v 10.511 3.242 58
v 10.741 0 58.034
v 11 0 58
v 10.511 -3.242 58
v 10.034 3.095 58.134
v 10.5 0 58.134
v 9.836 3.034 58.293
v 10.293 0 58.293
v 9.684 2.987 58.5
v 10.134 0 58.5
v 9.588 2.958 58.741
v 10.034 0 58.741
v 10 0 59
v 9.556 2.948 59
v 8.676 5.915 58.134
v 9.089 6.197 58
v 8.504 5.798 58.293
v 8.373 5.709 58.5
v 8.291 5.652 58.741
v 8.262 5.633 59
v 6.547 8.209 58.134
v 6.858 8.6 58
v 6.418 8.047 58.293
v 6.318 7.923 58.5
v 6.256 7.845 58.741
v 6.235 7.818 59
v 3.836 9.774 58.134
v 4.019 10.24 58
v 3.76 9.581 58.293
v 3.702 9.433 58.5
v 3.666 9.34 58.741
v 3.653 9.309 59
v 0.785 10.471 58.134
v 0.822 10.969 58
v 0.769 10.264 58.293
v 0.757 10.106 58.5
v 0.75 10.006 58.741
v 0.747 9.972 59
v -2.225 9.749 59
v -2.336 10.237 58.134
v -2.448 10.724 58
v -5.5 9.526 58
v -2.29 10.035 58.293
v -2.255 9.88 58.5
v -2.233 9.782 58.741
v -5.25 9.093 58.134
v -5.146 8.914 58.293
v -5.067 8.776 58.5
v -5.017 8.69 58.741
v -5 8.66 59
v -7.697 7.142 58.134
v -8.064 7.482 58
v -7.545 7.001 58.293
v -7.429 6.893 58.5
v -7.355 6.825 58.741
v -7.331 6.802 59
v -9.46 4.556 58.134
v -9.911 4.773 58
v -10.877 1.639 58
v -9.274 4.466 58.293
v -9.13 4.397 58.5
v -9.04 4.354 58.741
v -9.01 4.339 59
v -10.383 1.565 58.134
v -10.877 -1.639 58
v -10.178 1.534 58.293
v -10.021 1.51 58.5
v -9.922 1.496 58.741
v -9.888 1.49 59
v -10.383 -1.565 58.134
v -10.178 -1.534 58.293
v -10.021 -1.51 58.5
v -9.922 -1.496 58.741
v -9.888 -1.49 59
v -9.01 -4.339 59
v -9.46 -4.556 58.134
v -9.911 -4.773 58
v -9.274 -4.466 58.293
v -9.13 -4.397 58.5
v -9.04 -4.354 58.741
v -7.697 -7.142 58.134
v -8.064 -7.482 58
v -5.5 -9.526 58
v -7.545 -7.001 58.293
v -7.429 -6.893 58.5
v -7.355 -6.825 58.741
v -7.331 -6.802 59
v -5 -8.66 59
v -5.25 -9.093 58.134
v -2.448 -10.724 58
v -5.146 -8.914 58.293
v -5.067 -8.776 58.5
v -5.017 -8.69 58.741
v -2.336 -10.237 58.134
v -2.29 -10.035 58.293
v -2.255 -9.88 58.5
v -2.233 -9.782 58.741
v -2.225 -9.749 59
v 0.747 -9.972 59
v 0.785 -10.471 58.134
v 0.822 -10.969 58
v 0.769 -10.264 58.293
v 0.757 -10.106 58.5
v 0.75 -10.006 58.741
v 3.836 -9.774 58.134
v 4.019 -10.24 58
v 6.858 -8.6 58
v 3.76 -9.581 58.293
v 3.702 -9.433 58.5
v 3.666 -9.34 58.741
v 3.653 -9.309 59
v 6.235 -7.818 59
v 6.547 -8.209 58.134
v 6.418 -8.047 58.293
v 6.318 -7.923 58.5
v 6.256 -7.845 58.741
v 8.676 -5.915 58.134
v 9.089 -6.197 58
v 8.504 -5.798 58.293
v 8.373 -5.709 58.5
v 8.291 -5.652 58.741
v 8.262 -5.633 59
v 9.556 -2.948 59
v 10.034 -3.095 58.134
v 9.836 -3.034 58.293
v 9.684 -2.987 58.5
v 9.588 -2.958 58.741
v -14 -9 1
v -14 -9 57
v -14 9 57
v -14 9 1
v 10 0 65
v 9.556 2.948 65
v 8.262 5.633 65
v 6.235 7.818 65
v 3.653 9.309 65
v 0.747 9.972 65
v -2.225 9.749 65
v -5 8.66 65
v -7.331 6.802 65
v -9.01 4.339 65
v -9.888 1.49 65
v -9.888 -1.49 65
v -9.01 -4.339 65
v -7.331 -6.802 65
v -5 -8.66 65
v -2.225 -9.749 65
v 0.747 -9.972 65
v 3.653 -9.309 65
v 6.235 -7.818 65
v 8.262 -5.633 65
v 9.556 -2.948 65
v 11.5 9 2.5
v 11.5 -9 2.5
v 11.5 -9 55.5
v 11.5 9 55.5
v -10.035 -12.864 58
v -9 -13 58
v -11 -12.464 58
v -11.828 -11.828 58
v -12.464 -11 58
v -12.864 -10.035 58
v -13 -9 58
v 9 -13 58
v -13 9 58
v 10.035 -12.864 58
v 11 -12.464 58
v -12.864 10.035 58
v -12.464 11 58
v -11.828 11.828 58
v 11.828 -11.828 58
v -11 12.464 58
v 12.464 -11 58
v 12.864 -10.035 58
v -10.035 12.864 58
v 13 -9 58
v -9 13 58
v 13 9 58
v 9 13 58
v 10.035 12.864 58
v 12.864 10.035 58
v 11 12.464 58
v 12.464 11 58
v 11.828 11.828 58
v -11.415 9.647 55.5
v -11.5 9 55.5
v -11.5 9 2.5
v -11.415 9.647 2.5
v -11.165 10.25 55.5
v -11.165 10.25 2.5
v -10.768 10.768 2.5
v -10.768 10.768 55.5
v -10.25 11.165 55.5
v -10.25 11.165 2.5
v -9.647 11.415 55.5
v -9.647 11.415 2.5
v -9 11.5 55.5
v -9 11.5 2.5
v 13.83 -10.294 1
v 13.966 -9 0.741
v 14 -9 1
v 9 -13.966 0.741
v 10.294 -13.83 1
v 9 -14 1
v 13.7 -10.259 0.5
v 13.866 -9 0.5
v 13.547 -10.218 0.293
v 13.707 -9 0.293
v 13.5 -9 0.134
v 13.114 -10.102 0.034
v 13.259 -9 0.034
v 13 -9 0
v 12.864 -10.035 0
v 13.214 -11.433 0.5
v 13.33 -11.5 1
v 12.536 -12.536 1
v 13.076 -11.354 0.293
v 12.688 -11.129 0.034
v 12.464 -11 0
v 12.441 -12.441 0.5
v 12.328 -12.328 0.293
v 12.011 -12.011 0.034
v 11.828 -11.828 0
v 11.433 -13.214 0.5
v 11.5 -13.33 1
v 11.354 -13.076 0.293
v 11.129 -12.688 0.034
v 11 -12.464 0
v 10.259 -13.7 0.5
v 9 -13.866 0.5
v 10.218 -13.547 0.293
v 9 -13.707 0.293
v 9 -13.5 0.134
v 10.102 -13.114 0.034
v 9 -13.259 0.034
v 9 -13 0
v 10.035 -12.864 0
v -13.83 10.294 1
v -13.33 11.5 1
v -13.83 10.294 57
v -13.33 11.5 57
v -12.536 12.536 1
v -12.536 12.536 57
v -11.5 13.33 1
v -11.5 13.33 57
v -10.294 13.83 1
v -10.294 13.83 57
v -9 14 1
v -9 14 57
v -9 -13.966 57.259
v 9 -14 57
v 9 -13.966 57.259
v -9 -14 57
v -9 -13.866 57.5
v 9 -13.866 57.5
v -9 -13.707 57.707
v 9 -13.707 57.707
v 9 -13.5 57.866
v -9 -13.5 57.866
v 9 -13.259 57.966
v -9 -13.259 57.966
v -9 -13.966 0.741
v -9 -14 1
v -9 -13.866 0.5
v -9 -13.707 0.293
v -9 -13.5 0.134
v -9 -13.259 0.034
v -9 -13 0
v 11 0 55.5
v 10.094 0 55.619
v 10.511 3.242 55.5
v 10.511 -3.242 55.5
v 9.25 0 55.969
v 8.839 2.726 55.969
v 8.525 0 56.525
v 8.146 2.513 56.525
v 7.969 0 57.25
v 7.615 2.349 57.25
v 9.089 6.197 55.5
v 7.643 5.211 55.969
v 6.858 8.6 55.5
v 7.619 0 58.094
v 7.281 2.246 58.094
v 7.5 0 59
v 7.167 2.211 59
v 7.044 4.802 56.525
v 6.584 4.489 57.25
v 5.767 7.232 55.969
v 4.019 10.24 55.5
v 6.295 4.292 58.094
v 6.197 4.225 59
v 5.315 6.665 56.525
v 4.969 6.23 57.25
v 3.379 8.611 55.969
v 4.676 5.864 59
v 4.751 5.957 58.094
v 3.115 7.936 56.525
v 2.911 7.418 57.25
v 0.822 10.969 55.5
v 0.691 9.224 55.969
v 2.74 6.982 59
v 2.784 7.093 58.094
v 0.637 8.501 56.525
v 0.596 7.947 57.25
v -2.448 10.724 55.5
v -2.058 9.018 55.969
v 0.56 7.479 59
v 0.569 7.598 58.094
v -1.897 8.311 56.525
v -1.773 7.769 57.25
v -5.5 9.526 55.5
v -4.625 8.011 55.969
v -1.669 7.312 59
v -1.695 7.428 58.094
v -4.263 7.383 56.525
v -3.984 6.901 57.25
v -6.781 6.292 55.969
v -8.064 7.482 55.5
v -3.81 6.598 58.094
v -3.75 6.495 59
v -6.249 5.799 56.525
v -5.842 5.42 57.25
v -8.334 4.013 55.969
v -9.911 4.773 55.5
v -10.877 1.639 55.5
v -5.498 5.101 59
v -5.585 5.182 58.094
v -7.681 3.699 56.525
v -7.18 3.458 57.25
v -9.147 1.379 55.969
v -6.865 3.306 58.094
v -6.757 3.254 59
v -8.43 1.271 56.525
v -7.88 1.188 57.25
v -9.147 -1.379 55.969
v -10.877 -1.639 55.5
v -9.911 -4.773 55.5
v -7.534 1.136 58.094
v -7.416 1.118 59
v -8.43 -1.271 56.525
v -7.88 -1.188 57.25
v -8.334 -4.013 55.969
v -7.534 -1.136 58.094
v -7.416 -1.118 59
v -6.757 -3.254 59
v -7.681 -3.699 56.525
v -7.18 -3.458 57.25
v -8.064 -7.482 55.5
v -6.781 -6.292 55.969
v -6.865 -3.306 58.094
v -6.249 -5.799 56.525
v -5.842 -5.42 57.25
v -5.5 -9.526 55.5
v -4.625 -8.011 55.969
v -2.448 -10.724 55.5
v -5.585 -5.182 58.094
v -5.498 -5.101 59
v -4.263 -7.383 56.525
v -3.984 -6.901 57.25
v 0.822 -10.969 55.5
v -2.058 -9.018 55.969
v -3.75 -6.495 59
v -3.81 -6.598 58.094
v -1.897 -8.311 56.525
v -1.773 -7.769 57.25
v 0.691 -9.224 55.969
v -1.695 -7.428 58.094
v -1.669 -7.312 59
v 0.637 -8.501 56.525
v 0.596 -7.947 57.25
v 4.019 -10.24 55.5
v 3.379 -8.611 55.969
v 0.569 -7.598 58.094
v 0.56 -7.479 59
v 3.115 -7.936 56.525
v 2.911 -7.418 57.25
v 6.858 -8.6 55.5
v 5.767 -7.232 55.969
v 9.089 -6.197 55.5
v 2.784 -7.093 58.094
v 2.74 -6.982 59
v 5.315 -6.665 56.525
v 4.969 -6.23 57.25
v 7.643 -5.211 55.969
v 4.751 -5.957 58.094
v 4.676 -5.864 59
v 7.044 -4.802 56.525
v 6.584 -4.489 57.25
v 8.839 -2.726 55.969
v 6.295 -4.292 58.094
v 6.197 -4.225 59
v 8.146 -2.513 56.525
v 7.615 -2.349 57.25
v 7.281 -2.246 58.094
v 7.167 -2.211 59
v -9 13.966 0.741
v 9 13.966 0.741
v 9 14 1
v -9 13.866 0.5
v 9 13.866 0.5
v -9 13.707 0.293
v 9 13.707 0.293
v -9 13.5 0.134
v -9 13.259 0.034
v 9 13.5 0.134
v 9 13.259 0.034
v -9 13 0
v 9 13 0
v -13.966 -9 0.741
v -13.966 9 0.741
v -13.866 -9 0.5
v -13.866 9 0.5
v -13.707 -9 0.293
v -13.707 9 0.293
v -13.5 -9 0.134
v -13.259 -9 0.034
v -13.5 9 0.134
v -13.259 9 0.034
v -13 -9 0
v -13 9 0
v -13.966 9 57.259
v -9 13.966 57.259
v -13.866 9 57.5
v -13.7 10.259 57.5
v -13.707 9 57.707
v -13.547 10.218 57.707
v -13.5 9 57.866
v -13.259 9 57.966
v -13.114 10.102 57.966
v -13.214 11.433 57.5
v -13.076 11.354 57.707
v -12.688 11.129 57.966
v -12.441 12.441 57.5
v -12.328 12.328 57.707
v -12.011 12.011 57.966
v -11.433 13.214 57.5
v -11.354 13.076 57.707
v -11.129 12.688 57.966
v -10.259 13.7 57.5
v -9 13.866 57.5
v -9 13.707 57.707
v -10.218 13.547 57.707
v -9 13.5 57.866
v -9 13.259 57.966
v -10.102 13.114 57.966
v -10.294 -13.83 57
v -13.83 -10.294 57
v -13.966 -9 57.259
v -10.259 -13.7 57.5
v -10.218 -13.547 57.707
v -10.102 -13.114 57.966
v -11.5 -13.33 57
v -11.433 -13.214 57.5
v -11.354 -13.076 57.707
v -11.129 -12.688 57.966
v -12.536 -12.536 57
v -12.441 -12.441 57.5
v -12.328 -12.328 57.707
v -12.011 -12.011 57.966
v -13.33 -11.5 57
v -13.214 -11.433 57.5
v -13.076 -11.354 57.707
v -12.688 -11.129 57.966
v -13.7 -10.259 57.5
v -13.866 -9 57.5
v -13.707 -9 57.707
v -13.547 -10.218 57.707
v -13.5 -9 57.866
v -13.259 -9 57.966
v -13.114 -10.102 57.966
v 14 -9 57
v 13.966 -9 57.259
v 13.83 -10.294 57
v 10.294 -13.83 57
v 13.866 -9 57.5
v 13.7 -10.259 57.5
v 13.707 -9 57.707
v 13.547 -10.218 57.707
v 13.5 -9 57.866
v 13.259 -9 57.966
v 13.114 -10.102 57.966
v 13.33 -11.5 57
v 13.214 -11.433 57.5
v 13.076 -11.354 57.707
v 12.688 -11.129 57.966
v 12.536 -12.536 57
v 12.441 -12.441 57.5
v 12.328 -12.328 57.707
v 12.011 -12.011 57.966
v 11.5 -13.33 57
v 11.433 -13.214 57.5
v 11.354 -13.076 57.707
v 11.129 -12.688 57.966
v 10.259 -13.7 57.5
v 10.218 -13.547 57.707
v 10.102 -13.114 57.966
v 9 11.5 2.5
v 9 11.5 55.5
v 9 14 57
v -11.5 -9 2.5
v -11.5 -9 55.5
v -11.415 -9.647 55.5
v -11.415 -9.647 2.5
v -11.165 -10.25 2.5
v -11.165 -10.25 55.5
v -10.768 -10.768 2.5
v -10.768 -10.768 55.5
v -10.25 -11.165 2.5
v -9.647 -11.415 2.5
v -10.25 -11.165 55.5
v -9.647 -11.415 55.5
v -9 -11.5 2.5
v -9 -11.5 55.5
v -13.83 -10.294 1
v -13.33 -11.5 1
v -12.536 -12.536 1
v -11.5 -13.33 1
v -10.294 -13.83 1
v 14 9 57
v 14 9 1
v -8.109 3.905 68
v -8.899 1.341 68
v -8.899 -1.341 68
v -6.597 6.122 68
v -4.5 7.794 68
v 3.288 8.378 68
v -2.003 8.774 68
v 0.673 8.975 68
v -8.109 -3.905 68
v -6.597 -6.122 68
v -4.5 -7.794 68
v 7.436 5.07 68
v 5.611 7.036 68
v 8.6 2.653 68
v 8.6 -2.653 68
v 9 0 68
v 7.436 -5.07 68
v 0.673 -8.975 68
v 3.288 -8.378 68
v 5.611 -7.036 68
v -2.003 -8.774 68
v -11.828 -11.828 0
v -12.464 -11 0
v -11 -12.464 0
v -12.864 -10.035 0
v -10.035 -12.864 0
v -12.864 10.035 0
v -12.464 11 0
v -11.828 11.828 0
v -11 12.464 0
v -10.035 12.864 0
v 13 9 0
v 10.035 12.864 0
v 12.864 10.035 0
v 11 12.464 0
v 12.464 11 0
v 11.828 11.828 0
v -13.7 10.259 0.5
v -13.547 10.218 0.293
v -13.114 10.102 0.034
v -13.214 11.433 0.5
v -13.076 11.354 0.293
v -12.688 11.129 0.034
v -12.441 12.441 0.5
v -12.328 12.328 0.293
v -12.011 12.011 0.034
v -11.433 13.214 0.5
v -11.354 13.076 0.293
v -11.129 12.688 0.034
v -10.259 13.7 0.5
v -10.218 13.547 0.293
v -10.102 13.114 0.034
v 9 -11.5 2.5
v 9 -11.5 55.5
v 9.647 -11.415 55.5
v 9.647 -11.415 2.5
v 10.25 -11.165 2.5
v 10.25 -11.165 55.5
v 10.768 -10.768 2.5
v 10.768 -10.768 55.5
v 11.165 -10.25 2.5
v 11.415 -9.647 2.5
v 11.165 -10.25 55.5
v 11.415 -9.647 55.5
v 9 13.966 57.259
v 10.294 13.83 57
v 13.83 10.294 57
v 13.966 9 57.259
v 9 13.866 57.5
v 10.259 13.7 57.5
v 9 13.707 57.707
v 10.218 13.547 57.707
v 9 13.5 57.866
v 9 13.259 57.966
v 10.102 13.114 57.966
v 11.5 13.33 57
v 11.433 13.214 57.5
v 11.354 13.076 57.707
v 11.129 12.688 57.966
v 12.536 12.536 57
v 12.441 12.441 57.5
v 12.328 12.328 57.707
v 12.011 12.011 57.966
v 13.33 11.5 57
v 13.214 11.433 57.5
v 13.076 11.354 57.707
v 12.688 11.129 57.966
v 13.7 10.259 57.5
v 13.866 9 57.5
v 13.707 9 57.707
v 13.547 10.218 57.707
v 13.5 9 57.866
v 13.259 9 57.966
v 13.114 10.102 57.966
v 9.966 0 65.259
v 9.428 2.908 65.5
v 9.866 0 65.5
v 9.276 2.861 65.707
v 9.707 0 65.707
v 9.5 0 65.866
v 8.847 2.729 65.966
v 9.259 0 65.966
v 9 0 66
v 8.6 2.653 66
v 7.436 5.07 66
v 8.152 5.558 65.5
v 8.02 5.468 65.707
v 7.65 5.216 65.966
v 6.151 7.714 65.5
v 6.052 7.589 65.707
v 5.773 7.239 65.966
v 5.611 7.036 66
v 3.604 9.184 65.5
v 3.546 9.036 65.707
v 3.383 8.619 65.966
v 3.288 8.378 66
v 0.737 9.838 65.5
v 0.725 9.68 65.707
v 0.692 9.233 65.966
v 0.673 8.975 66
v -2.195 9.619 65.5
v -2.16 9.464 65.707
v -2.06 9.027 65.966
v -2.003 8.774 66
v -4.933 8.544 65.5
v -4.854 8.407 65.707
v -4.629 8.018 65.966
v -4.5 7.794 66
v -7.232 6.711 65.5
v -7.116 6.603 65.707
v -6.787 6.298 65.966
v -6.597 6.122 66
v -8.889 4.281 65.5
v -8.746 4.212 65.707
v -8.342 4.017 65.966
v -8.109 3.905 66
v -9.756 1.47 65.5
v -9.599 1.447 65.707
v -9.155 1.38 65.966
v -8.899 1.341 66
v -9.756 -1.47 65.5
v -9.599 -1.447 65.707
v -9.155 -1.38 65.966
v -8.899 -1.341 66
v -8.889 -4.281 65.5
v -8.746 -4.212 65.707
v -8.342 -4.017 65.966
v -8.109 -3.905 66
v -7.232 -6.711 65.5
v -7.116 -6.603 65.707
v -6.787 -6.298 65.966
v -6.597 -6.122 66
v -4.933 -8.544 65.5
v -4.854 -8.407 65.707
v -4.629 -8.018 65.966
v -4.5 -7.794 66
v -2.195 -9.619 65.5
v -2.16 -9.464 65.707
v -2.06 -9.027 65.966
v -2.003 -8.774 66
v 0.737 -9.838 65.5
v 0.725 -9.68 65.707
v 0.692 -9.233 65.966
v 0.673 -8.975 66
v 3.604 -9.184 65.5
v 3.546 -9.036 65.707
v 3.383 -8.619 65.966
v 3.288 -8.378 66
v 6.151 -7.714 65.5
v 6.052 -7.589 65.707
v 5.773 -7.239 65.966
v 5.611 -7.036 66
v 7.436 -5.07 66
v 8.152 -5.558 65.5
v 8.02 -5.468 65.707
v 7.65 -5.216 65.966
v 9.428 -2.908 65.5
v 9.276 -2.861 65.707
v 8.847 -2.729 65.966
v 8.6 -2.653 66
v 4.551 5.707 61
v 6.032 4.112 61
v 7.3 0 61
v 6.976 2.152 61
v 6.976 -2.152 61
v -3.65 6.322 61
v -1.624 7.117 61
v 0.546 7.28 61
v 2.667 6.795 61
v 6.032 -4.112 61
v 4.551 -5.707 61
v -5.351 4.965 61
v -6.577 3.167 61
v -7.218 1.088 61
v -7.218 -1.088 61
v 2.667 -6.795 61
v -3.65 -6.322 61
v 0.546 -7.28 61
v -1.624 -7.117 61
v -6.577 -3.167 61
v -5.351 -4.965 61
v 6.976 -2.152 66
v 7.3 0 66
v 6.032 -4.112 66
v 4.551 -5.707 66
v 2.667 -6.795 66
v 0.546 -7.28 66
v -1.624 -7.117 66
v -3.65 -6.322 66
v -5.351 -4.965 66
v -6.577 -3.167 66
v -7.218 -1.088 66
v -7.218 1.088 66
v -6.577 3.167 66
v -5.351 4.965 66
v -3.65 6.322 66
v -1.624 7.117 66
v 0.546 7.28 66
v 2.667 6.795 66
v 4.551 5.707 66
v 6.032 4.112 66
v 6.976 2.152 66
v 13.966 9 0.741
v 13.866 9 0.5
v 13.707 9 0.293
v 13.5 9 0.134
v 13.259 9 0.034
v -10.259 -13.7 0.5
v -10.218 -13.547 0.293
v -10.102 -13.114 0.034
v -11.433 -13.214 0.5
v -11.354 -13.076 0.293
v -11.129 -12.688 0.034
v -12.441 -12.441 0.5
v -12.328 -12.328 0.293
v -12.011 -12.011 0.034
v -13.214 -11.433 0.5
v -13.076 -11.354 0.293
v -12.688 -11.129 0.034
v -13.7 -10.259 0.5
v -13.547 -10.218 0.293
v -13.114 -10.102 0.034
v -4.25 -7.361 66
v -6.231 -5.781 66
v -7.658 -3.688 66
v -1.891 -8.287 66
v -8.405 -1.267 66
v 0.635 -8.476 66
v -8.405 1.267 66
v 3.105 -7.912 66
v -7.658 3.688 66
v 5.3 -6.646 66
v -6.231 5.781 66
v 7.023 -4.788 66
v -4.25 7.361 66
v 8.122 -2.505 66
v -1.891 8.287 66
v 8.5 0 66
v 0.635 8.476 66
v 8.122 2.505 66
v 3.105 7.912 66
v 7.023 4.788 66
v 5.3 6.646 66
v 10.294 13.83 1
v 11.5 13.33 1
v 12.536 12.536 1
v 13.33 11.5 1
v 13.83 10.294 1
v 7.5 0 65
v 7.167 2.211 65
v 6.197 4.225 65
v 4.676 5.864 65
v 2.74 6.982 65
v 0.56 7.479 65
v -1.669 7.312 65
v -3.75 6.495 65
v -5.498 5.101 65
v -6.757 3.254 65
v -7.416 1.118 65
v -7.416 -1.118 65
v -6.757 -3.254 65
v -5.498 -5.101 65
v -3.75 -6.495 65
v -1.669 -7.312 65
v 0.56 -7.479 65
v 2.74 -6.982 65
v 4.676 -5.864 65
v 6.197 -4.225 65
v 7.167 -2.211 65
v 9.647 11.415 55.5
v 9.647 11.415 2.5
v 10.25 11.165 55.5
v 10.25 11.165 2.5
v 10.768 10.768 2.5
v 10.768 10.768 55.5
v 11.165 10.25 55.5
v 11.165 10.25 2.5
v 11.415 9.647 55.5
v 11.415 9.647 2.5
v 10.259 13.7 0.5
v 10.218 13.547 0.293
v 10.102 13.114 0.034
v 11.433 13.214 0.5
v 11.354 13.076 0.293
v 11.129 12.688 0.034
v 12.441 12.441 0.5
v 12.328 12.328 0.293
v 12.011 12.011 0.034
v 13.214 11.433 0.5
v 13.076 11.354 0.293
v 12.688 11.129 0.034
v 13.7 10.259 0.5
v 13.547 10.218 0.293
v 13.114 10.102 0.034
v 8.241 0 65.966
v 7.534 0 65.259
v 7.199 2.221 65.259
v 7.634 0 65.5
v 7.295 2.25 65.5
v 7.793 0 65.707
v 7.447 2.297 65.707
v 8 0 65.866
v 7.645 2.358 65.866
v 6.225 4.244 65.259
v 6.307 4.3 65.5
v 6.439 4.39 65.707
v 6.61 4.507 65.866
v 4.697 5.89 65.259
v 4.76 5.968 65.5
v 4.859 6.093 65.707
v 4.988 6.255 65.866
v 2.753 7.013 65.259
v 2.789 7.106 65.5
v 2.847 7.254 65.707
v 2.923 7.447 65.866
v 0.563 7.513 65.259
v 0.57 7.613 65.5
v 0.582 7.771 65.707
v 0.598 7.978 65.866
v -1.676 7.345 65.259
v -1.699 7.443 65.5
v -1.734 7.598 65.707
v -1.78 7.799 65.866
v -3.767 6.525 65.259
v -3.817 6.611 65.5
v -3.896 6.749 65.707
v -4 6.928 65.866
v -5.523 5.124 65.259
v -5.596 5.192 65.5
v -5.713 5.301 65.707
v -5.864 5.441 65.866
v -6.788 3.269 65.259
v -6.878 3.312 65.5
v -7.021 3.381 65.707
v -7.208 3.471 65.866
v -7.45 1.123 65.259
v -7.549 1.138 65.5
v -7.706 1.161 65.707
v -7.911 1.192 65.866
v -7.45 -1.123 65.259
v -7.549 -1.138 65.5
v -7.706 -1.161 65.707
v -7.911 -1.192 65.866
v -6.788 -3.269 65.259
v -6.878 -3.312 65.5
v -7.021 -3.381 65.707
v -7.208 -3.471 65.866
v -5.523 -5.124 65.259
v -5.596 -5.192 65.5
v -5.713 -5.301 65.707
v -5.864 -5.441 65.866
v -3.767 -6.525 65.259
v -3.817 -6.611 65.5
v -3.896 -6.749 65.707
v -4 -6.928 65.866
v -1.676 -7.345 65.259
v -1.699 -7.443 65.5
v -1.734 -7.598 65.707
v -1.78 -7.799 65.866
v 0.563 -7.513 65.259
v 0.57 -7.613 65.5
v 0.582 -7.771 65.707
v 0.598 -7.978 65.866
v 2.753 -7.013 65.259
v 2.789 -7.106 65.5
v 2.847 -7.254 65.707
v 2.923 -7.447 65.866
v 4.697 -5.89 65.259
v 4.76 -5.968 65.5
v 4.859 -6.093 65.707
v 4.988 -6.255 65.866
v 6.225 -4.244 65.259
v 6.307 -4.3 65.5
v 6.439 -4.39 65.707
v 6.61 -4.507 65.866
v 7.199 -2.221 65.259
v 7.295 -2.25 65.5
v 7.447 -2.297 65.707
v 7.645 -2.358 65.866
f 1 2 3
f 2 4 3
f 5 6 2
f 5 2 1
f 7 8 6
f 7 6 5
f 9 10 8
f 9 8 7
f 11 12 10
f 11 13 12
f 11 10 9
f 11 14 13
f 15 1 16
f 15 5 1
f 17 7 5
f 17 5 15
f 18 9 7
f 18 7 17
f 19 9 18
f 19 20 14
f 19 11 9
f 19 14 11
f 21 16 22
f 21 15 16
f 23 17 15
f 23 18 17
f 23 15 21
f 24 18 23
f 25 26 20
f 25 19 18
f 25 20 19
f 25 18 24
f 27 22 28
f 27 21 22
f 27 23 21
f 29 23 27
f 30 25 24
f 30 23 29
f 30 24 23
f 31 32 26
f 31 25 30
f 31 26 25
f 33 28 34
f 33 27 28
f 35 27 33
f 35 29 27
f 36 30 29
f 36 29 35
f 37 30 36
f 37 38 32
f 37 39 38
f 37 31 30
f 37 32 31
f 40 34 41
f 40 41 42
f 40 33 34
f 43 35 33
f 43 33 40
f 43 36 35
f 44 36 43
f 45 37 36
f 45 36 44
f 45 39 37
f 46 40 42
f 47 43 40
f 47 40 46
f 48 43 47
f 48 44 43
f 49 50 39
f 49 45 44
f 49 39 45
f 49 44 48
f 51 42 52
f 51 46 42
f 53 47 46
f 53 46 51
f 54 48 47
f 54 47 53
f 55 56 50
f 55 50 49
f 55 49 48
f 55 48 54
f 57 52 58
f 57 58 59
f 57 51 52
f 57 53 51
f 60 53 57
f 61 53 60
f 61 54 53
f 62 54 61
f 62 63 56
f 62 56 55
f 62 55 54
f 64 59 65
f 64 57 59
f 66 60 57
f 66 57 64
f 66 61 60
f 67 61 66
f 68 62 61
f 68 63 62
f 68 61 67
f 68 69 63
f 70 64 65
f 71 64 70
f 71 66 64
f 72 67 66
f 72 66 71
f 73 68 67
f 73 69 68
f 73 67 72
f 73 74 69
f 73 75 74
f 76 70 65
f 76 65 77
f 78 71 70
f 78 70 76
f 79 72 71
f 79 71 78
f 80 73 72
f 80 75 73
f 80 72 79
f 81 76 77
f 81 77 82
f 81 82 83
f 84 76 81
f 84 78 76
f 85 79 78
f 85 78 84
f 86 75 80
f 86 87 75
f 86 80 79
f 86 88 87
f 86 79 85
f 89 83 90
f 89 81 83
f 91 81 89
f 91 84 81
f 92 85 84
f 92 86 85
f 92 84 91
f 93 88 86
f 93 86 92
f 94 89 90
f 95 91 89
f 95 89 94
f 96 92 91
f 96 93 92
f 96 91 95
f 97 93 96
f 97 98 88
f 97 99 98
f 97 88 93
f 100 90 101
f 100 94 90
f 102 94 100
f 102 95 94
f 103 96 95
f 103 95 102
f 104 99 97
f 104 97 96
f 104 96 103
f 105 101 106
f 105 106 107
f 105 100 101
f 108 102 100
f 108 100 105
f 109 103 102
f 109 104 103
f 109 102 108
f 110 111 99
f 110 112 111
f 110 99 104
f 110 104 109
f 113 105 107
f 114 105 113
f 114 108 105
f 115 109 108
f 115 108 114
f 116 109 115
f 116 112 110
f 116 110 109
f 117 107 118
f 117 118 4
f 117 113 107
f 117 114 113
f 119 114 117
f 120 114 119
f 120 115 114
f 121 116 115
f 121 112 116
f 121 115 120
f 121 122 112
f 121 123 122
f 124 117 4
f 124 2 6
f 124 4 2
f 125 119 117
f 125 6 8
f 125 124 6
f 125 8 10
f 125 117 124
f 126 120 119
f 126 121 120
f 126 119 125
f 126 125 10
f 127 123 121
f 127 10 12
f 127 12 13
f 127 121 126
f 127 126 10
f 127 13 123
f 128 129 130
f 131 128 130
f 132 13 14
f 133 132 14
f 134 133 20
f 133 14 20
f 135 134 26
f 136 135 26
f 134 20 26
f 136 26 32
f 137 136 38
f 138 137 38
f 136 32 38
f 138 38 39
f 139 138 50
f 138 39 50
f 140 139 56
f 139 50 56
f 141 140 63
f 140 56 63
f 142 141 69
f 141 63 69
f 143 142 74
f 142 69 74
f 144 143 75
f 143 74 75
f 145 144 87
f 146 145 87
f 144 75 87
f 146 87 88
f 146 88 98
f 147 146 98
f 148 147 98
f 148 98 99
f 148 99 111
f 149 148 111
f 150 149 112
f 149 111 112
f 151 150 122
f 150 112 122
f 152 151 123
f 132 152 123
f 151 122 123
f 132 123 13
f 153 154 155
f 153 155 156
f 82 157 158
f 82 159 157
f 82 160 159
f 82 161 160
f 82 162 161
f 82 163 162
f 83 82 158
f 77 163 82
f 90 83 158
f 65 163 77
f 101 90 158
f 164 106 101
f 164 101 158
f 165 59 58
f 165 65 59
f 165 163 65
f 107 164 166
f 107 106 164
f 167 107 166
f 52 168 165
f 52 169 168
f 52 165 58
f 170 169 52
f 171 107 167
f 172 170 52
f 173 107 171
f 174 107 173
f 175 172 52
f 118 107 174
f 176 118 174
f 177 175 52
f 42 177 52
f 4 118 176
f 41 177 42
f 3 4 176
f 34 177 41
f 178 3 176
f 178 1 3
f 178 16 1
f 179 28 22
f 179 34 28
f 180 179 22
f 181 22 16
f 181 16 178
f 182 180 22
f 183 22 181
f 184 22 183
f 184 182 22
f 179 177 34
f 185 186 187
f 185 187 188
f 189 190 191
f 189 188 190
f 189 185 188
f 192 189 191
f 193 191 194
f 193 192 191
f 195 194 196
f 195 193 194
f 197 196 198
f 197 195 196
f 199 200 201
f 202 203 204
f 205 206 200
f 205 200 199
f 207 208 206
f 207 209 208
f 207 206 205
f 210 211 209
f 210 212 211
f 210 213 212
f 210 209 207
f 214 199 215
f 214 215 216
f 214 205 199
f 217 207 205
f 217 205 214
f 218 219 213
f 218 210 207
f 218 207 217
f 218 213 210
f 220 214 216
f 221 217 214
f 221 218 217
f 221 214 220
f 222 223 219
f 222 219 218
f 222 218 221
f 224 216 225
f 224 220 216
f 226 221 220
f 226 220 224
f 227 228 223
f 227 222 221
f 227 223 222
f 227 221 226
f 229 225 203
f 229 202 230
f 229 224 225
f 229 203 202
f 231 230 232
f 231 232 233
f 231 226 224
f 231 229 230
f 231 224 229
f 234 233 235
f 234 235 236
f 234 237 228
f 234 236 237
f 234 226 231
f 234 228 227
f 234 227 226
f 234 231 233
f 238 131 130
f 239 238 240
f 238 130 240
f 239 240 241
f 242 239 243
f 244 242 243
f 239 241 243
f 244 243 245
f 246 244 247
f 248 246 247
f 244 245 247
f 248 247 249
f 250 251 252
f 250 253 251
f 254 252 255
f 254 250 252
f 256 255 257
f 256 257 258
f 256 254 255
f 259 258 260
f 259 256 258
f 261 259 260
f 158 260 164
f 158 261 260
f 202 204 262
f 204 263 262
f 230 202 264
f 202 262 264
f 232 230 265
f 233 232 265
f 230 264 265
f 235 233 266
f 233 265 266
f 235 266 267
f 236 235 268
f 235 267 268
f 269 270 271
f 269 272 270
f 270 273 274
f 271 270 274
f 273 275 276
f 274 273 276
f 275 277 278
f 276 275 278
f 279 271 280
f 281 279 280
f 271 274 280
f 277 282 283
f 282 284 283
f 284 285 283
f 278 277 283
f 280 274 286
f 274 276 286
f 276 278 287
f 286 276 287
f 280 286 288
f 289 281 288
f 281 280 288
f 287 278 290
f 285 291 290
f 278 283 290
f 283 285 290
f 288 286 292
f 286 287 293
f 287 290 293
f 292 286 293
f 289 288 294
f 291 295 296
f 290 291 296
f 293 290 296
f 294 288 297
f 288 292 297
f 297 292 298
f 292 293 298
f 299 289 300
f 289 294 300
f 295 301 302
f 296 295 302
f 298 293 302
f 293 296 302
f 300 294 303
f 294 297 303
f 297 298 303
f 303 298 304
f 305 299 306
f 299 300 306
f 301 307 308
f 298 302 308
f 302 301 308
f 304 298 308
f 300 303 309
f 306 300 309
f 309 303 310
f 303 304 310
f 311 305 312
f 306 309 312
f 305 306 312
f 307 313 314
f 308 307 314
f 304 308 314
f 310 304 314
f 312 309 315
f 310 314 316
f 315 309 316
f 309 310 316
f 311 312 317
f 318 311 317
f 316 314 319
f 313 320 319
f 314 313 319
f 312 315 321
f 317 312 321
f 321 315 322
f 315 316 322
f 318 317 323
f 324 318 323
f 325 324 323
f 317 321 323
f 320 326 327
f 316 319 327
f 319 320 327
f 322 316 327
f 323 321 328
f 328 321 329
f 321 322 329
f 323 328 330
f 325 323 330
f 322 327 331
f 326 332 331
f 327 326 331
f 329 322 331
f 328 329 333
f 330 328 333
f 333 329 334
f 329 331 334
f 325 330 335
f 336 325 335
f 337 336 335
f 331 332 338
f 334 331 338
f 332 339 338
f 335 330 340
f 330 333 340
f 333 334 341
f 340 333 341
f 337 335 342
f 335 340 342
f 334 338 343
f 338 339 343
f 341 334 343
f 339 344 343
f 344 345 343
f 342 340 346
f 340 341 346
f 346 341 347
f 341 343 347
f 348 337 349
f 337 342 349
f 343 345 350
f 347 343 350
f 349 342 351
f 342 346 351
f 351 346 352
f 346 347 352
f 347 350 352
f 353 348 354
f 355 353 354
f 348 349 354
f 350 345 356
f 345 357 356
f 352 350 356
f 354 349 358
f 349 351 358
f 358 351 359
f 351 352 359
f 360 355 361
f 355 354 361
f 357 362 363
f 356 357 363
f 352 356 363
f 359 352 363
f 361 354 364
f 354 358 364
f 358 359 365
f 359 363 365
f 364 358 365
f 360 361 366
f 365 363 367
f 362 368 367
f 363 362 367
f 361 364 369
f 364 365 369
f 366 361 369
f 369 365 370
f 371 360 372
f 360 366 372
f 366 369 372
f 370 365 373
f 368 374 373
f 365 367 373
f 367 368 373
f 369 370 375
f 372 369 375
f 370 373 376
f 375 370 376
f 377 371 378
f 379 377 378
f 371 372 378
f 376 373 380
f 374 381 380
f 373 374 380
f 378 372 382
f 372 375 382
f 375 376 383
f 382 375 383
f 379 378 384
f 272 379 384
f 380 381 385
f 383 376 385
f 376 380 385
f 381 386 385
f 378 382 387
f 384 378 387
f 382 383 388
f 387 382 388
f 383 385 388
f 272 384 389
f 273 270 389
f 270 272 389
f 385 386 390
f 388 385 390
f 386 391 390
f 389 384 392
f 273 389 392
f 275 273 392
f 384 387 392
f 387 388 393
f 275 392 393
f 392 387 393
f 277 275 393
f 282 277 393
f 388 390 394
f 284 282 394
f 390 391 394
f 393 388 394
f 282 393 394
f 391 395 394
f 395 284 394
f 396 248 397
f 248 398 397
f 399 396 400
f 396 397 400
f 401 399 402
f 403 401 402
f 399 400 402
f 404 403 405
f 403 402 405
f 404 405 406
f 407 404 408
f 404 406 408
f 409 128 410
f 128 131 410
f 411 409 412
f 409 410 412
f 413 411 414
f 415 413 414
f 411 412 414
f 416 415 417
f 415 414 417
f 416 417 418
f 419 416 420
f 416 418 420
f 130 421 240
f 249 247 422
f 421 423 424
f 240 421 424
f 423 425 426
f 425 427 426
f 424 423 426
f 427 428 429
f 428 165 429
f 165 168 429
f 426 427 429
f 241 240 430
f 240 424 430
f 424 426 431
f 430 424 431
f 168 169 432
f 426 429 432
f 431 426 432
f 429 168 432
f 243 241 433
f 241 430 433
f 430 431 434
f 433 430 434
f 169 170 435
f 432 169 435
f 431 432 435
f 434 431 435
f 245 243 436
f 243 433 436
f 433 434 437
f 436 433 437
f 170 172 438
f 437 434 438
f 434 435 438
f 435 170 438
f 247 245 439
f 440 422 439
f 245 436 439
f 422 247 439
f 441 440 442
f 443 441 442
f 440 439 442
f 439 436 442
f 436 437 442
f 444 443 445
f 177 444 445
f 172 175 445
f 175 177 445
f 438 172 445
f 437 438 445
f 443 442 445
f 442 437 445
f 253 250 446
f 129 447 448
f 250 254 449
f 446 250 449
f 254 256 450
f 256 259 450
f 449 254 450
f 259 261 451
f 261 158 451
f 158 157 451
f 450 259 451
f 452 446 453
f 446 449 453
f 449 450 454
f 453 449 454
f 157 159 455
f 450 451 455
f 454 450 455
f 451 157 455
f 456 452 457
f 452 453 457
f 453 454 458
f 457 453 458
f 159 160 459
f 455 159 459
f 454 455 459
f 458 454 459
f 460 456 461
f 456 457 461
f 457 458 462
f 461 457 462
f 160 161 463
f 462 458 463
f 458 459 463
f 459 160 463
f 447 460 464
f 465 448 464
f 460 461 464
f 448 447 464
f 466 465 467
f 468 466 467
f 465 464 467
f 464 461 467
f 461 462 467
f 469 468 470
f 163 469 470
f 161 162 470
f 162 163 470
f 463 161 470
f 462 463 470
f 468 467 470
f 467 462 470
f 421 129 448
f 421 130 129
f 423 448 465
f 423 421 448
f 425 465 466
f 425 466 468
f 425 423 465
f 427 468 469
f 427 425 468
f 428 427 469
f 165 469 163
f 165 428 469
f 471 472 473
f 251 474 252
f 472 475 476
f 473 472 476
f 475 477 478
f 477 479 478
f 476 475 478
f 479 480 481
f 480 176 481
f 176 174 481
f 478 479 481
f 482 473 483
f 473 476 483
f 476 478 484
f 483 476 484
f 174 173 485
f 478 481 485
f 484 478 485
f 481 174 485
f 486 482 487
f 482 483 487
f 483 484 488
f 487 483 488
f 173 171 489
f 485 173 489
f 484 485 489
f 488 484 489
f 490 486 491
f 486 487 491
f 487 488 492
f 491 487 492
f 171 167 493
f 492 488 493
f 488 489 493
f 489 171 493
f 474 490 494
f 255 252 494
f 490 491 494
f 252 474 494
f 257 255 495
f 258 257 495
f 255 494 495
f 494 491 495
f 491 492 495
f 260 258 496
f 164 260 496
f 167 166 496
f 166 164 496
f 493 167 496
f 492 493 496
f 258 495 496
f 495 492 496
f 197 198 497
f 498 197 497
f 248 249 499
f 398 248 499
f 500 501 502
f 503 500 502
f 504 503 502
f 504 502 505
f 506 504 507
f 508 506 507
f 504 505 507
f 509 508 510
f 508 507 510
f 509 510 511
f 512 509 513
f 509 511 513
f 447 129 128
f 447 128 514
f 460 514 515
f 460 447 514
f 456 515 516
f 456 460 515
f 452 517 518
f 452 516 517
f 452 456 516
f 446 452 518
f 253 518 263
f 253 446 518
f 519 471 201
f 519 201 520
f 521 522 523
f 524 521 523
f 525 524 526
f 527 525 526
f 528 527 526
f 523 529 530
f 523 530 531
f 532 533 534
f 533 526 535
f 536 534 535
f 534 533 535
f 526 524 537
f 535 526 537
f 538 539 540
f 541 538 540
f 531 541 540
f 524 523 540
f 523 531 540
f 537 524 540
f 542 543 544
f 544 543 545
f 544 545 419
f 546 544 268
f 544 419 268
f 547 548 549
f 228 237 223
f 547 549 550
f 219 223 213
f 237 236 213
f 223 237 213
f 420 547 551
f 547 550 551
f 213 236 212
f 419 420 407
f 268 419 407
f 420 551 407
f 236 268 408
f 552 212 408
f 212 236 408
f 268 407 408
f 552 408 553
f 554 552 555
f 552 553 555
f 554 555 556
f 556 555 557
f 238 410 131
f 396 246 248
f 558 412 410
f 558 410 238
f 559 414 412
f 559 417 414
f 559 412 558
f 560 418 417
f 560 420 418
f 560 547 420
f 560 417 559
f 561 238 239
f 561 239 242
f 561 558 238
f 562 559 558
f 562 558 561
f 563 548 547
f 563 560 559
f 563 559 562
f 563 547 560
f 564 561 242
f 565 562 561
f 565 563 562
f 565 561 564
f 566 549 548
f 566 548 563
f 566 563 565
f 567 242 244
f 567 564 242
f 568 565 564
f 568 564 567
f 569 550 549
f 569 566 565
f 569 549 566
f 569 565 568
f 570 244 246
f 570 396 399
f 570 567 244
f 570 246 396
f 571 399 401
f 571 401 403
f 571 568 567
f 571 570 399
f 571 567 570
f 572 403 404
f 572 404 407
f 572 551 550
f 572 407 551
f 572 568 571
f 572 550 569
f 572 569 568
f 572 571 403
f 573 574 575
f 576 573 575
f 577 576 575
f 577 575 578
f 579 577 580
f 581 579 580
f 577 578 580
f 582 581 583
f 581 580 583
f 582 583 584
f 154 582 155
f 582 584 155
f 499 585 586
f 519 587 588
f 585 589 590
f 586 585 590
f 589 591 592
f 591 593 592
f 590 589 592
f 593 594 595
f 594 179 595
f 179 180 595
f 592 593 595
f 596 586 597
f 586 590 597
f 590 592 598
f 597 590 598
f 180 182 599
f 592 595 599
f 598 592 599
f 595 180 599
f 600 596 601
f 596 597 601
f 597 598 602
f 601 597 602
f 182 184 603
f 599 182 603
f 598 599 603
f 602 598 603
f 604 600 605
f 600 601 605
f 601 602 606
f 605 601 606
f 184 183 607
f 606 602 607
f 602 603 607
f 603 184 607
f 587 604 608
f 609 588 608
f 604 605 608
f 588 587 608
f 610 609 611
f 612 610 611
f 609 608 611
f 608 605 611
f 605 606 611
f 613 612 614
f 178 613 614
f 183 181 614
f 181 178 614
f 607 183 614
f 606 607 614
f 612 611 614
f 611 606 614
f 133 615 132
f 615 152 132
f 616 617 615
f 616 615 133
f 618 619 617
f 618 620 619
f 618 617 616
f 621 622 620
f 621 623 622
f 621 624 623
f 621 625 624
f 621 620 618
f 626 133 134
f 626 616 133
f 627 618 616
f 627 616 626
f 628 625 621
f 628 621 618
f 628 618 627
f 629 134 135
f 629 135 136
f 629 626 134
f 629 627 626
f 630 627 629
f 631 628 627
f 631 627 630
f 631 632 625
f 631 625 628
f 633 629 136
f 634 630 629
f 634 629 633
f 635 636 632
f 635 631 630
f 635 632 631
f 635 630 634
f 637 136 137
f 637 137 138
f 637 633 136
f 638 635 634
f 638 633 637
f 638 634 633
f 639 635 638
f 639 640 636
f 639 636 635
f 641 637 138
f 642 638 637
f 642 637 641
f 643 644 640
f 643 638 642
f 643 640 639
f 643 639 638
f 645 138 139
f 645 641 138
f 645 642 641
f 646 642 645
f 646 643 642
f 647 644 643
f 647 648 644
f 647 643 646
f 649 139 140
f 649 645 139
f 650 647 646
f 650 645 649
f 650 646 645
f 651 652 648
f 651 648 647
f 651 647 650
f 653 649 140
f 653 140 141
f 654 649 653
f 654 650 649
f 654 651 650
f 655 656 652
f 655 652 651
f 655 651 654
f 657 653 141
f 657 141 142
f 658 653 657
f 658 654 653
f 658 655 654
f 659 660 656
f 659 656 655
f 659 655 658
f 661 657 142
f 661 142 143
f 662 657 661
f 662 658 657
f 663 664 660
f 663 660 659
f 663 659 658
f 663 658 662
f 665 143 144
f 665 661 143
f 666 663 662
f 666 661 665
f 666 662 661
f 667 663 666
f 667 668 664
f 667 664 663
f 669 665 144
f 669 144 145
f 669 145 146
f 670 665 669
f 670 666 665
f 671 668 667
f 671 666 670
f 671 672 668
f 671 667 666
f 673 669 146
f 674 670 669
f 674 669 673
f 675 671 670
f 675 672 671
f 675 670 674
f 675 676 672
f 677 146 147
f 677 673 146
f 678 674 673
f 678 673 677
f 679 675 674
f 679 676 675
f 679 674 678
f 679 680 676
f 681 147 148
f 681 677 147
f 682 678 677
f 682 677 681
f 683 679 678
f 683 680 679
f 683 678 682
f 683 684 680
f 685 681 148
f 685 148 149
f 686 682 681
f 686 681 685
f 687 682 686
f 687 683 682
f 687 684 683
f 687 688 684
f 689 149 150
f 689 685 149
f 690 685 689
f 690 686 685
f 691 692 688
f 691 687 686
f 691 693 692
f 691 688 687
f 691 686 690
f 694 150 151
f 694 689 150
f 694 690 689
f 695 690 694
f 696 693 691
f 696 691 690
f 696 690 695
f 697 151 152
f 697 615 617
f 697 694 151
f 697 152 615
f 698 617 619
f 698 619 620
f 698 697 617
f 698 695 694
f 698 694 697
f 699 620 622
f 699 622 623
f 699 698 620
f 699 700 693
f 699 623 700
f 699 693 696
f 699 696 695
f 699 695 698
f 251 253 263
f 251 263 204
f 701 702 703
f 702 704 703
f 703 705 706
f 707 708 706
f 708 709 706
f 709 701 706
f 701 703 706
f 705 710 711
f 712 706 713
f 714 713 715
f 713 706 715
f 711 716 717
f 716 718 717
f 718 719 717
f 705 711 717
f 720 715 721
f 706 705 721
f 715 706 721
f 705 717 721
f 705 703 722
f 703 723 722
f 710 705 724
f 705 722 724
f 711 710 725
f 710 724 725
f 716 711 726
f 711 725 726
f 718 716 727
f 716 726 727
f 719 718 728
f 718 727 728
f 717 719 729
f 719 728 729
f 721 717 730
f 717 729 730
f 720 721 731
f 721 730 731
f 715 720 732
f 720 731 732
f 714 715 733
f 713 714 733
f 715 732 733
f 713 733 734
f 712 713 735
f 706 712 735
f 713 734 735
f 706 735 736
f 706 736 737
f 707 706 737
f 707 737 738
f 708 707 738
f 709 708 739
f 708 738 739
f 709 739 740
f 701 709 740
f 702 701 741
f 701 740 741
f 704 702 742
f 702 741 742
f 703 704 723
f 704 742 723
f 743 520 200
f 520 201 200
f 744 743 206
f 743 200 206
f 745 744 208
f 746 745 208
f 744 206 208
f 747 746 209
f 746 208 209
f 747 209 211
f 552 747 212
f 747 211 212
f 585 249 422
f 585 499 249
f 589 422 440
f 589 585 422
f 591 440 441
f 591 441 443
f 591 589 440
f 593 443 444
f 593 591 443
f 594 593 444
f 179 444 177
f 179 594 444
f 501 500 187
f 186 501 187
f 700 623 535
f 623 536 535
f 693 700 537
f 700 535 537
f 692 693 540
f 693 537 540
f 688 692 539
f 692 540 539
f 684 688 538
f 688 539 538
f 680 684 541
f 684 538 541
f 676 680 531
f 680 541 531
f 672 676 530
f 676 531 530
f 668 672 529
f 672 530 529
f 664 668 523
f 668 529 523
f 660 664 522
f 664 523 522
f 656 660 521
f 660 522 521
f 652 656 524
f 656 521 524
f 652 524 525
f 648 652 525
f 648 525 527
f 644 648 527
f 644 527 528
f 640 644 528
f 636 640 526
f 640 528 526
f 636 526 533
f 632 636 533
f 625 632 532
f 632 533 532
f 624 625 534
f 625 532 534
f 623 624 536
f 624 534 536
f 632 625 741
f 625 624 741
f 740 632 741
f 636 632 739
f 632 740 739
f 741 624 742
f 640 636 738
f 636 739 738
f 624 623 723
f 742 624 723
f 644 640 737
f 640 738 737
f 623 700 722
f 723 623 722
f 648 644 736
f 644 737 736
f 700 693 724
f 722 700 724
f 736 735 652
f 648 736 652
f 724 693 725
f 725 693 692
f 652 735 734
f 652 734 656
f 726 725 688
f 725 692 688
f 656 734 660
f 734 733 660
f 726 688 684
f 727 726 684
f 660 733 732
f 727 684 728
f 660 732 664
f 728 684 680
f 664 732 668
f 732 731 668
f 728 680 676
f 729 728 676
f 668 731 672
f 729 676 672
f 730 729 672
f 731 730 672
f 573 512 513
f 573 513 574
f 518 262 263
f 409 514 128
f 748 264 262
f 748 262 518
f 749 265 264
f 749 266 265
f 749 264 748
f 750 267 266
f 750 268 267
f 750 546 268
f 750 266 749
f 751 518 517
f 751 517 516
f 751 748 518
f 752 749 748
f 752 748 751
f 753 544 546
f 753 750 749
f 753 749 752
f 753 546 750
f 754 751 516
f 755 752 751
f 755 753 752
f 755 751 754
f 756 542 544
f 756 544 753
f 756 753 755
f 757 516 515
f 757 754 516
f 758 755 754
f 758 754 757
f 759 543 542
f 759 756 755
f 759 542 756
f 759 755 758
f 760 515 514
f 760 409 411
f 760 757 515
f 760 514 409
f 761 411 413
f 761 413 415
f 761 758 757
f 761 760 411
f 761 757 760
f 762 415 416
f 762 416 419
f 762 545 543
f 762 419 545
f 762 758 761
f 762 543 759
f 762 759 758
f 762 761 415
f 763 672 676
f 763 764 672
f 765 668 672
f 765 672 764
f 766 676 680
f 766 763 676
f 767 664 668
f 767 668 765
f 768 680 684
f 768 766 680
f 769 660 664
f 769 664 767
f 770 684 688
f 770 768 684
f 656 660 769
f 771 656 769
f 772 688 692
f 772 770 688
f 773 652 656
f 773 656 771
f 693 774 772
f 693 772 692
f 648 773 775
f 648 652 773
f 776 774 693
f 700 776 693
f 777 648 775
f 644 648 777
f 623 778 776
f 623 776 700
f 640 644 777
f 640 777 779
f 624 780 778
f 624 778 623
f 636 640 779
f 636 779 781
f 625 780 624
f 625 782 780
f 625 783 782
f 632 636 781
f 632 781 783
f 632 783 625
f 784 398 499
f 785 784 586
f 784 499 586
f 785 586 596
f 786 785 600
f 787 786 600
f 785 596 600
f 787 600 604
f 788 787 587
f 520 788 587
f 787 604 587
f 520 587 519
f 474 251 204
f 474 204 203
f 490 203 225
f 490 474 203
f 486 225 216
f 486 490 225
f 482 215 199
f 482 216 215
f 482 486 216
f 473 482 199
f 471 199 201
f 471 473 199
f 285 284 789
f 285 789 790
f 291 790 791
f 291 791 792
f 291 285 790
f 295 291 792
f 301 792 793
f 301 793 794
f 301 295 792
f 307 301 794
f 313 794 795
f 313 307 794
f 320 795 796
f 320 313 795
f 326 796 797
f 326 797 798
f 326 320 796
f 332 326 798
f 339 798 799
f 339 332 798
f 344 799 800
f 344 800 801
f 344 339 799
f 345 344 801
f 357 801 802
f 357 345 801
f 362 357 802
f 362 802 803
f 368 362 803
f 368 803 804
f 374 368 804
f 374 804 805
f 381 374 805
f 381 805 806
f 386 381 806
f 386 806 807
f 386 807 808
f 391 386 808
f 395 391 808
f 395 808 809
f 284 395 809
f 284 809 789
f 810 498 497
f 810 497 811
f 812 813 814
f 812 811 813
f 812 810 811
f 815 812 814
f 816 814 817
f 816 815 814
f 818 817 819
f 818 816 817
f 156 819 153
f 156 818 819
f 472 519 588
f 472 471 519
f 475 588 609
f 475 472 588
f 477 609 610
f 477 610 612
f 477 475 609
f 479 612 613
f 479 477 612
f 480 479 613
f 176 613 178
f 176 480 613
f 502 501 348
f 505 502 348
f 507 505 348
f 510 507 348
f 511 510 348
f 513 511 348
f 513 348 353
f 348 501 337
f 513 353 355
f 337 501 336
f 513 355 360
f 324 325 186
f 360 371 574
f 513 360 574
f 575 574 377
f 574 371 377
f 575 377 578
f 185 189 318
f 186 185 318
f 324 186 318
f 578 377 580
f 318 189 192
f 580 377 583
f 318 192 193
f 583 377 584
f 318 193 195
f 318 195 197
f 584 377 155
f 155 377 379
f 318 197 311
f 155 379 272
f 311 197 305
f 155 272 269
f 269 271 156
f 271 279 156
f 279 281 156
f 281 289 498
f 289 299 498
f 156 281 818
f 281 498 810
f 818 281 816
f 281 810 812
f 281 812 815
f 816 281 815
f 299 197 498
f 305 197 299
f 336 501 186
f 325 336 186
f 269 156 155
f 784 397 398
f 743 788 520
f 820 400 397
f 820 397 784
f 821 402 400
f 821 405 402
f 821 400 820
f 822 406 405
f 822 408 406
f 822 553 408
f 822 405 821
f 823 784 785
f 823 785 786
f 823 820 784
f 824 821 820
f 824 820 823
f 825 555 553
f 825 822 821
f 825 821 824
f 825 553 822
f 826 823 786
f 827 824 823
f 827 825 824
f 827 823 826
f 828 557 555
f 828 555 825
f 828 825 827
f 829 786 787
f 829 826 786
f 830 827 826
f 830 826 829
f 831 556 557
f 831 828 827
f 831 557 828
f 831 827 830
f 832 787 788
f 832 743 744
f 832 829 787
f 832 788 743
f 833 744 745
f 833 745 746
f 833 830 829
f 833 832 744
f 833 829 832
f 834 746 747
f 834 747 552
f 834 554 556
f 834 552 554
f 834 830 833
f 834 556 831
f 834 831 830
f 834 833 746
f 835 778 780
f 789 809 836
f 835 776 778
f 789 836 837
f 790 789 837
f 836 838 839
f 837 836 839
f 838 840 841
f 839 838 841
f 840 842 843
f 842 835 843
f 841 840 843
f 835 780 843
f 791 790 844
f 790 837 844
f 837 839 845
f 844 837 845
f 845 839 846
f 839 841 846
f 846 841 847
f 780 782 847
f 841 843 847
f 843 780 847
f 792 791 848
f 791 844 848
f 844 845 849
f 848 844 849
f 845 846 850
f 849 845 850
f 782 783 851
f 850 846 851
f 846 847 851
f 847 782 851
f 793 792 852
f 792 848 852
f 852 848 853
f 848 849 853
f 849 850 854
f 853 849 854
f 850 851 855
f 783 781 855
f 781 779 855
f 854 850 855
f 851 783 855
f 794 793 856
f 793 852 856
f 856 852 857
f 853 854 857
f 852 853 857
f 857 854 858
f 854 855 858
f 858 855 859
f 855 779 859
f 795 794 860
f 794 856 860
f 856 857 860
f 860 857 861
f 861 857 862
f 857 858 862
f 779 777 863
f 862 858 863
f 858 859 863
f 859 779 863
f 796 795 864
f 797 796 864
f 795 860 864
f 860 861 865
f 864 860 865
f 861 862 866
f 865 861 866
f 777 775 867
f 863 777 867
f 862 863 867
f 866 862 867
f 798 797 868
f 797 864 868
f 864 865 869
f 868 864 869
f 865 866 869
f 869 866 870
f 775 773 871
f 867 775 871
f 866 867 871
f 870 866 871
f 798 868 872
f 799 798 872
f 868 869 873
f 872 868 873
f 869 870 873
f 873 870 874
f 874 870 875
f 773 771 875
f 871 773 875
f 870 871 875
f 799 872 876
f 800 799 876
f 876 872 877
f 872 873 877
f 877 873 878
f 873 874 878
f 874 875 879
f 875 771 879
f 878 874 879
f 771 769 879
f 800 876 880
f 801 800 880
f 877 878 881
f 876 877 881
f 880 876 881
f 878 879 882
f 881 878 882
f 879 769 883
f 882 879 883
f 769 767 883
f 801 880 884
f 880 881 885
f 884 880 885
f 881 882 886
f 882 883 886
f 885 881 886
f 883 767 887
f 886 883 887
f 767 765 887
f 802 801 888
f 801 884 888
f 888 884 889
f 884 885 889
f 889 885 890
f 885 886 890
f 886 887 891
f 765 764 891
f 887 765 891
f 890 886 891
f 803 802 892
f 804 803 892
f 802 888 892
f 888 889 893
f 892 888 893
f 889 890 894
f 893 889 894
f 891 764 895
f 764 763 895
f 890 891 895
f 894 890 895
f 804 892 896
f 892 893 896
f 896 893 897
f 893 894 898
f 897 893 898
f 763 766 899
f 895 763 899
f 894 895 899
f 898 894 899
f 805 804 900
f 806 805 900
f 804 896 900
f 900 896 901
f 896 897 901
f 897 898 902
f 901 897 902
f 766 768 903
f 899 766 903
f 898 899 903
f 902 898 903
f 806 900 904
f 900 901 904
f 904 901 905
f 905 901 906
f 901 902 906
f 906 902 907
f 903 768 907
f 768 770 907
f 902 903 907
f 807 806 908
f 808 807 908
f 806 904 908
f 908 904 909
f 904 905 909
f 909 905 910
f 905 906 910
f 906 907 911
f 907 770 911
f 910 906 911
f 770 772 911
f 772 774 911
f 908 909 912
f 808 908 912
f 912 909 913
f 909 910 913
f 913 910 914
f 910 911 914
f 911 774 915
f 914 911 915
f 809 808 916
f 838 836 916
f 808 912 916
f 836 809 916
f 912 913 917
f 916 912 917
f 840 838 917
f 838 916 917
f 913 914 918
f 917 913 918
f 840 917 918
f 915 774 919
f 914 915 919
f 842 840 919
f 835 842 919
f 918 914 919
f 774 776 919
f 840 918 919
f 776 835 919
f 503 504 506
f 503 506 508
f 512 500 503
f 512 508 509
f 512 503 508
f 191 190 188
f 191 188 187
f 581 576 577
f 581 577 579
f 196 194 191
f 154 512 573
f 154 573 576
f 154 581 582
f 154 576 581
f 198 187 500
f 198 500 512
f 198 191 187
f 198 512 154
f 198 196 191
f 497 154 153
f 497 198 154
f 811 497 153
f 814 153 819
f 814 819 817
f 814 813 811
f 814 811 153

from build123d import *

# Parameters (mm, degrees)
F0_W     = 28
F0_H     = 28
F1_DEPTH = 58
F2_R     = 10
F3_DEPTH = 8
F4_R     = 5
F5_R     = 1
F6_T     = -2.5
F7_R     = 1


with BuildPart() as f1:
    # F0 (on Top) → F1 (new body)
    with BuildSketch(Plane.XY):
        Rectangle(F0_W, F0_H)
    extrude(amount=F1_DEPTH)

    # F2 (on face) → F3 (join)
    with BuildSketch(Plane.XY.offset(58)):
        Circle(F2_R)
    extrude(amount=F3_DEPTH)

    # F4
    f4_edges = [f1.edges().sort_by_distance(p)[0] for p in [
        (-14, -14, 29),
        (14, -14, 29),
        (14, 14, 29),
        (-14, 14, 29),
    ]]
    fillet(f4_edges, radius=F4_R)

    # F5
    f5_edges = [f1.edges().sort_by_distance(p)[0] for p in [
        (-10, 0, 58),
        (-14, 0, 58),
        (-14, 0, 0),
    ]]
    fillet(f5_edges, radius=F5_R)

    # F6
    f6_openings = [f1.faces().sort_by_distance(p)[0] for p in [
        (0, 0, 66),
    ]]
    offset(amount=F6_T, openings=f6_openings)

    # F7
    f7_edges = [f1.edges().sort_by_distance(p)[0] for p in [
        (-10, 0, 66),
        (-7.5, 0, 66),
    ]]
    fillet(f7_edges, radius=F7_R)


with BuildPart() as f9:
    # F8 (on Front) → F9 (revolve)
    with BuildSketch(Plane.XZ):
        Polygon((9, 68), (0, 68), (0, 61), (7.3, 61), (7.3, 66), (9, 66), align=None)
    revolve(axis=Axis((0, 0, 64.5), (0, 0, -1)))


solid = Compound([f1.part, f9.part])
